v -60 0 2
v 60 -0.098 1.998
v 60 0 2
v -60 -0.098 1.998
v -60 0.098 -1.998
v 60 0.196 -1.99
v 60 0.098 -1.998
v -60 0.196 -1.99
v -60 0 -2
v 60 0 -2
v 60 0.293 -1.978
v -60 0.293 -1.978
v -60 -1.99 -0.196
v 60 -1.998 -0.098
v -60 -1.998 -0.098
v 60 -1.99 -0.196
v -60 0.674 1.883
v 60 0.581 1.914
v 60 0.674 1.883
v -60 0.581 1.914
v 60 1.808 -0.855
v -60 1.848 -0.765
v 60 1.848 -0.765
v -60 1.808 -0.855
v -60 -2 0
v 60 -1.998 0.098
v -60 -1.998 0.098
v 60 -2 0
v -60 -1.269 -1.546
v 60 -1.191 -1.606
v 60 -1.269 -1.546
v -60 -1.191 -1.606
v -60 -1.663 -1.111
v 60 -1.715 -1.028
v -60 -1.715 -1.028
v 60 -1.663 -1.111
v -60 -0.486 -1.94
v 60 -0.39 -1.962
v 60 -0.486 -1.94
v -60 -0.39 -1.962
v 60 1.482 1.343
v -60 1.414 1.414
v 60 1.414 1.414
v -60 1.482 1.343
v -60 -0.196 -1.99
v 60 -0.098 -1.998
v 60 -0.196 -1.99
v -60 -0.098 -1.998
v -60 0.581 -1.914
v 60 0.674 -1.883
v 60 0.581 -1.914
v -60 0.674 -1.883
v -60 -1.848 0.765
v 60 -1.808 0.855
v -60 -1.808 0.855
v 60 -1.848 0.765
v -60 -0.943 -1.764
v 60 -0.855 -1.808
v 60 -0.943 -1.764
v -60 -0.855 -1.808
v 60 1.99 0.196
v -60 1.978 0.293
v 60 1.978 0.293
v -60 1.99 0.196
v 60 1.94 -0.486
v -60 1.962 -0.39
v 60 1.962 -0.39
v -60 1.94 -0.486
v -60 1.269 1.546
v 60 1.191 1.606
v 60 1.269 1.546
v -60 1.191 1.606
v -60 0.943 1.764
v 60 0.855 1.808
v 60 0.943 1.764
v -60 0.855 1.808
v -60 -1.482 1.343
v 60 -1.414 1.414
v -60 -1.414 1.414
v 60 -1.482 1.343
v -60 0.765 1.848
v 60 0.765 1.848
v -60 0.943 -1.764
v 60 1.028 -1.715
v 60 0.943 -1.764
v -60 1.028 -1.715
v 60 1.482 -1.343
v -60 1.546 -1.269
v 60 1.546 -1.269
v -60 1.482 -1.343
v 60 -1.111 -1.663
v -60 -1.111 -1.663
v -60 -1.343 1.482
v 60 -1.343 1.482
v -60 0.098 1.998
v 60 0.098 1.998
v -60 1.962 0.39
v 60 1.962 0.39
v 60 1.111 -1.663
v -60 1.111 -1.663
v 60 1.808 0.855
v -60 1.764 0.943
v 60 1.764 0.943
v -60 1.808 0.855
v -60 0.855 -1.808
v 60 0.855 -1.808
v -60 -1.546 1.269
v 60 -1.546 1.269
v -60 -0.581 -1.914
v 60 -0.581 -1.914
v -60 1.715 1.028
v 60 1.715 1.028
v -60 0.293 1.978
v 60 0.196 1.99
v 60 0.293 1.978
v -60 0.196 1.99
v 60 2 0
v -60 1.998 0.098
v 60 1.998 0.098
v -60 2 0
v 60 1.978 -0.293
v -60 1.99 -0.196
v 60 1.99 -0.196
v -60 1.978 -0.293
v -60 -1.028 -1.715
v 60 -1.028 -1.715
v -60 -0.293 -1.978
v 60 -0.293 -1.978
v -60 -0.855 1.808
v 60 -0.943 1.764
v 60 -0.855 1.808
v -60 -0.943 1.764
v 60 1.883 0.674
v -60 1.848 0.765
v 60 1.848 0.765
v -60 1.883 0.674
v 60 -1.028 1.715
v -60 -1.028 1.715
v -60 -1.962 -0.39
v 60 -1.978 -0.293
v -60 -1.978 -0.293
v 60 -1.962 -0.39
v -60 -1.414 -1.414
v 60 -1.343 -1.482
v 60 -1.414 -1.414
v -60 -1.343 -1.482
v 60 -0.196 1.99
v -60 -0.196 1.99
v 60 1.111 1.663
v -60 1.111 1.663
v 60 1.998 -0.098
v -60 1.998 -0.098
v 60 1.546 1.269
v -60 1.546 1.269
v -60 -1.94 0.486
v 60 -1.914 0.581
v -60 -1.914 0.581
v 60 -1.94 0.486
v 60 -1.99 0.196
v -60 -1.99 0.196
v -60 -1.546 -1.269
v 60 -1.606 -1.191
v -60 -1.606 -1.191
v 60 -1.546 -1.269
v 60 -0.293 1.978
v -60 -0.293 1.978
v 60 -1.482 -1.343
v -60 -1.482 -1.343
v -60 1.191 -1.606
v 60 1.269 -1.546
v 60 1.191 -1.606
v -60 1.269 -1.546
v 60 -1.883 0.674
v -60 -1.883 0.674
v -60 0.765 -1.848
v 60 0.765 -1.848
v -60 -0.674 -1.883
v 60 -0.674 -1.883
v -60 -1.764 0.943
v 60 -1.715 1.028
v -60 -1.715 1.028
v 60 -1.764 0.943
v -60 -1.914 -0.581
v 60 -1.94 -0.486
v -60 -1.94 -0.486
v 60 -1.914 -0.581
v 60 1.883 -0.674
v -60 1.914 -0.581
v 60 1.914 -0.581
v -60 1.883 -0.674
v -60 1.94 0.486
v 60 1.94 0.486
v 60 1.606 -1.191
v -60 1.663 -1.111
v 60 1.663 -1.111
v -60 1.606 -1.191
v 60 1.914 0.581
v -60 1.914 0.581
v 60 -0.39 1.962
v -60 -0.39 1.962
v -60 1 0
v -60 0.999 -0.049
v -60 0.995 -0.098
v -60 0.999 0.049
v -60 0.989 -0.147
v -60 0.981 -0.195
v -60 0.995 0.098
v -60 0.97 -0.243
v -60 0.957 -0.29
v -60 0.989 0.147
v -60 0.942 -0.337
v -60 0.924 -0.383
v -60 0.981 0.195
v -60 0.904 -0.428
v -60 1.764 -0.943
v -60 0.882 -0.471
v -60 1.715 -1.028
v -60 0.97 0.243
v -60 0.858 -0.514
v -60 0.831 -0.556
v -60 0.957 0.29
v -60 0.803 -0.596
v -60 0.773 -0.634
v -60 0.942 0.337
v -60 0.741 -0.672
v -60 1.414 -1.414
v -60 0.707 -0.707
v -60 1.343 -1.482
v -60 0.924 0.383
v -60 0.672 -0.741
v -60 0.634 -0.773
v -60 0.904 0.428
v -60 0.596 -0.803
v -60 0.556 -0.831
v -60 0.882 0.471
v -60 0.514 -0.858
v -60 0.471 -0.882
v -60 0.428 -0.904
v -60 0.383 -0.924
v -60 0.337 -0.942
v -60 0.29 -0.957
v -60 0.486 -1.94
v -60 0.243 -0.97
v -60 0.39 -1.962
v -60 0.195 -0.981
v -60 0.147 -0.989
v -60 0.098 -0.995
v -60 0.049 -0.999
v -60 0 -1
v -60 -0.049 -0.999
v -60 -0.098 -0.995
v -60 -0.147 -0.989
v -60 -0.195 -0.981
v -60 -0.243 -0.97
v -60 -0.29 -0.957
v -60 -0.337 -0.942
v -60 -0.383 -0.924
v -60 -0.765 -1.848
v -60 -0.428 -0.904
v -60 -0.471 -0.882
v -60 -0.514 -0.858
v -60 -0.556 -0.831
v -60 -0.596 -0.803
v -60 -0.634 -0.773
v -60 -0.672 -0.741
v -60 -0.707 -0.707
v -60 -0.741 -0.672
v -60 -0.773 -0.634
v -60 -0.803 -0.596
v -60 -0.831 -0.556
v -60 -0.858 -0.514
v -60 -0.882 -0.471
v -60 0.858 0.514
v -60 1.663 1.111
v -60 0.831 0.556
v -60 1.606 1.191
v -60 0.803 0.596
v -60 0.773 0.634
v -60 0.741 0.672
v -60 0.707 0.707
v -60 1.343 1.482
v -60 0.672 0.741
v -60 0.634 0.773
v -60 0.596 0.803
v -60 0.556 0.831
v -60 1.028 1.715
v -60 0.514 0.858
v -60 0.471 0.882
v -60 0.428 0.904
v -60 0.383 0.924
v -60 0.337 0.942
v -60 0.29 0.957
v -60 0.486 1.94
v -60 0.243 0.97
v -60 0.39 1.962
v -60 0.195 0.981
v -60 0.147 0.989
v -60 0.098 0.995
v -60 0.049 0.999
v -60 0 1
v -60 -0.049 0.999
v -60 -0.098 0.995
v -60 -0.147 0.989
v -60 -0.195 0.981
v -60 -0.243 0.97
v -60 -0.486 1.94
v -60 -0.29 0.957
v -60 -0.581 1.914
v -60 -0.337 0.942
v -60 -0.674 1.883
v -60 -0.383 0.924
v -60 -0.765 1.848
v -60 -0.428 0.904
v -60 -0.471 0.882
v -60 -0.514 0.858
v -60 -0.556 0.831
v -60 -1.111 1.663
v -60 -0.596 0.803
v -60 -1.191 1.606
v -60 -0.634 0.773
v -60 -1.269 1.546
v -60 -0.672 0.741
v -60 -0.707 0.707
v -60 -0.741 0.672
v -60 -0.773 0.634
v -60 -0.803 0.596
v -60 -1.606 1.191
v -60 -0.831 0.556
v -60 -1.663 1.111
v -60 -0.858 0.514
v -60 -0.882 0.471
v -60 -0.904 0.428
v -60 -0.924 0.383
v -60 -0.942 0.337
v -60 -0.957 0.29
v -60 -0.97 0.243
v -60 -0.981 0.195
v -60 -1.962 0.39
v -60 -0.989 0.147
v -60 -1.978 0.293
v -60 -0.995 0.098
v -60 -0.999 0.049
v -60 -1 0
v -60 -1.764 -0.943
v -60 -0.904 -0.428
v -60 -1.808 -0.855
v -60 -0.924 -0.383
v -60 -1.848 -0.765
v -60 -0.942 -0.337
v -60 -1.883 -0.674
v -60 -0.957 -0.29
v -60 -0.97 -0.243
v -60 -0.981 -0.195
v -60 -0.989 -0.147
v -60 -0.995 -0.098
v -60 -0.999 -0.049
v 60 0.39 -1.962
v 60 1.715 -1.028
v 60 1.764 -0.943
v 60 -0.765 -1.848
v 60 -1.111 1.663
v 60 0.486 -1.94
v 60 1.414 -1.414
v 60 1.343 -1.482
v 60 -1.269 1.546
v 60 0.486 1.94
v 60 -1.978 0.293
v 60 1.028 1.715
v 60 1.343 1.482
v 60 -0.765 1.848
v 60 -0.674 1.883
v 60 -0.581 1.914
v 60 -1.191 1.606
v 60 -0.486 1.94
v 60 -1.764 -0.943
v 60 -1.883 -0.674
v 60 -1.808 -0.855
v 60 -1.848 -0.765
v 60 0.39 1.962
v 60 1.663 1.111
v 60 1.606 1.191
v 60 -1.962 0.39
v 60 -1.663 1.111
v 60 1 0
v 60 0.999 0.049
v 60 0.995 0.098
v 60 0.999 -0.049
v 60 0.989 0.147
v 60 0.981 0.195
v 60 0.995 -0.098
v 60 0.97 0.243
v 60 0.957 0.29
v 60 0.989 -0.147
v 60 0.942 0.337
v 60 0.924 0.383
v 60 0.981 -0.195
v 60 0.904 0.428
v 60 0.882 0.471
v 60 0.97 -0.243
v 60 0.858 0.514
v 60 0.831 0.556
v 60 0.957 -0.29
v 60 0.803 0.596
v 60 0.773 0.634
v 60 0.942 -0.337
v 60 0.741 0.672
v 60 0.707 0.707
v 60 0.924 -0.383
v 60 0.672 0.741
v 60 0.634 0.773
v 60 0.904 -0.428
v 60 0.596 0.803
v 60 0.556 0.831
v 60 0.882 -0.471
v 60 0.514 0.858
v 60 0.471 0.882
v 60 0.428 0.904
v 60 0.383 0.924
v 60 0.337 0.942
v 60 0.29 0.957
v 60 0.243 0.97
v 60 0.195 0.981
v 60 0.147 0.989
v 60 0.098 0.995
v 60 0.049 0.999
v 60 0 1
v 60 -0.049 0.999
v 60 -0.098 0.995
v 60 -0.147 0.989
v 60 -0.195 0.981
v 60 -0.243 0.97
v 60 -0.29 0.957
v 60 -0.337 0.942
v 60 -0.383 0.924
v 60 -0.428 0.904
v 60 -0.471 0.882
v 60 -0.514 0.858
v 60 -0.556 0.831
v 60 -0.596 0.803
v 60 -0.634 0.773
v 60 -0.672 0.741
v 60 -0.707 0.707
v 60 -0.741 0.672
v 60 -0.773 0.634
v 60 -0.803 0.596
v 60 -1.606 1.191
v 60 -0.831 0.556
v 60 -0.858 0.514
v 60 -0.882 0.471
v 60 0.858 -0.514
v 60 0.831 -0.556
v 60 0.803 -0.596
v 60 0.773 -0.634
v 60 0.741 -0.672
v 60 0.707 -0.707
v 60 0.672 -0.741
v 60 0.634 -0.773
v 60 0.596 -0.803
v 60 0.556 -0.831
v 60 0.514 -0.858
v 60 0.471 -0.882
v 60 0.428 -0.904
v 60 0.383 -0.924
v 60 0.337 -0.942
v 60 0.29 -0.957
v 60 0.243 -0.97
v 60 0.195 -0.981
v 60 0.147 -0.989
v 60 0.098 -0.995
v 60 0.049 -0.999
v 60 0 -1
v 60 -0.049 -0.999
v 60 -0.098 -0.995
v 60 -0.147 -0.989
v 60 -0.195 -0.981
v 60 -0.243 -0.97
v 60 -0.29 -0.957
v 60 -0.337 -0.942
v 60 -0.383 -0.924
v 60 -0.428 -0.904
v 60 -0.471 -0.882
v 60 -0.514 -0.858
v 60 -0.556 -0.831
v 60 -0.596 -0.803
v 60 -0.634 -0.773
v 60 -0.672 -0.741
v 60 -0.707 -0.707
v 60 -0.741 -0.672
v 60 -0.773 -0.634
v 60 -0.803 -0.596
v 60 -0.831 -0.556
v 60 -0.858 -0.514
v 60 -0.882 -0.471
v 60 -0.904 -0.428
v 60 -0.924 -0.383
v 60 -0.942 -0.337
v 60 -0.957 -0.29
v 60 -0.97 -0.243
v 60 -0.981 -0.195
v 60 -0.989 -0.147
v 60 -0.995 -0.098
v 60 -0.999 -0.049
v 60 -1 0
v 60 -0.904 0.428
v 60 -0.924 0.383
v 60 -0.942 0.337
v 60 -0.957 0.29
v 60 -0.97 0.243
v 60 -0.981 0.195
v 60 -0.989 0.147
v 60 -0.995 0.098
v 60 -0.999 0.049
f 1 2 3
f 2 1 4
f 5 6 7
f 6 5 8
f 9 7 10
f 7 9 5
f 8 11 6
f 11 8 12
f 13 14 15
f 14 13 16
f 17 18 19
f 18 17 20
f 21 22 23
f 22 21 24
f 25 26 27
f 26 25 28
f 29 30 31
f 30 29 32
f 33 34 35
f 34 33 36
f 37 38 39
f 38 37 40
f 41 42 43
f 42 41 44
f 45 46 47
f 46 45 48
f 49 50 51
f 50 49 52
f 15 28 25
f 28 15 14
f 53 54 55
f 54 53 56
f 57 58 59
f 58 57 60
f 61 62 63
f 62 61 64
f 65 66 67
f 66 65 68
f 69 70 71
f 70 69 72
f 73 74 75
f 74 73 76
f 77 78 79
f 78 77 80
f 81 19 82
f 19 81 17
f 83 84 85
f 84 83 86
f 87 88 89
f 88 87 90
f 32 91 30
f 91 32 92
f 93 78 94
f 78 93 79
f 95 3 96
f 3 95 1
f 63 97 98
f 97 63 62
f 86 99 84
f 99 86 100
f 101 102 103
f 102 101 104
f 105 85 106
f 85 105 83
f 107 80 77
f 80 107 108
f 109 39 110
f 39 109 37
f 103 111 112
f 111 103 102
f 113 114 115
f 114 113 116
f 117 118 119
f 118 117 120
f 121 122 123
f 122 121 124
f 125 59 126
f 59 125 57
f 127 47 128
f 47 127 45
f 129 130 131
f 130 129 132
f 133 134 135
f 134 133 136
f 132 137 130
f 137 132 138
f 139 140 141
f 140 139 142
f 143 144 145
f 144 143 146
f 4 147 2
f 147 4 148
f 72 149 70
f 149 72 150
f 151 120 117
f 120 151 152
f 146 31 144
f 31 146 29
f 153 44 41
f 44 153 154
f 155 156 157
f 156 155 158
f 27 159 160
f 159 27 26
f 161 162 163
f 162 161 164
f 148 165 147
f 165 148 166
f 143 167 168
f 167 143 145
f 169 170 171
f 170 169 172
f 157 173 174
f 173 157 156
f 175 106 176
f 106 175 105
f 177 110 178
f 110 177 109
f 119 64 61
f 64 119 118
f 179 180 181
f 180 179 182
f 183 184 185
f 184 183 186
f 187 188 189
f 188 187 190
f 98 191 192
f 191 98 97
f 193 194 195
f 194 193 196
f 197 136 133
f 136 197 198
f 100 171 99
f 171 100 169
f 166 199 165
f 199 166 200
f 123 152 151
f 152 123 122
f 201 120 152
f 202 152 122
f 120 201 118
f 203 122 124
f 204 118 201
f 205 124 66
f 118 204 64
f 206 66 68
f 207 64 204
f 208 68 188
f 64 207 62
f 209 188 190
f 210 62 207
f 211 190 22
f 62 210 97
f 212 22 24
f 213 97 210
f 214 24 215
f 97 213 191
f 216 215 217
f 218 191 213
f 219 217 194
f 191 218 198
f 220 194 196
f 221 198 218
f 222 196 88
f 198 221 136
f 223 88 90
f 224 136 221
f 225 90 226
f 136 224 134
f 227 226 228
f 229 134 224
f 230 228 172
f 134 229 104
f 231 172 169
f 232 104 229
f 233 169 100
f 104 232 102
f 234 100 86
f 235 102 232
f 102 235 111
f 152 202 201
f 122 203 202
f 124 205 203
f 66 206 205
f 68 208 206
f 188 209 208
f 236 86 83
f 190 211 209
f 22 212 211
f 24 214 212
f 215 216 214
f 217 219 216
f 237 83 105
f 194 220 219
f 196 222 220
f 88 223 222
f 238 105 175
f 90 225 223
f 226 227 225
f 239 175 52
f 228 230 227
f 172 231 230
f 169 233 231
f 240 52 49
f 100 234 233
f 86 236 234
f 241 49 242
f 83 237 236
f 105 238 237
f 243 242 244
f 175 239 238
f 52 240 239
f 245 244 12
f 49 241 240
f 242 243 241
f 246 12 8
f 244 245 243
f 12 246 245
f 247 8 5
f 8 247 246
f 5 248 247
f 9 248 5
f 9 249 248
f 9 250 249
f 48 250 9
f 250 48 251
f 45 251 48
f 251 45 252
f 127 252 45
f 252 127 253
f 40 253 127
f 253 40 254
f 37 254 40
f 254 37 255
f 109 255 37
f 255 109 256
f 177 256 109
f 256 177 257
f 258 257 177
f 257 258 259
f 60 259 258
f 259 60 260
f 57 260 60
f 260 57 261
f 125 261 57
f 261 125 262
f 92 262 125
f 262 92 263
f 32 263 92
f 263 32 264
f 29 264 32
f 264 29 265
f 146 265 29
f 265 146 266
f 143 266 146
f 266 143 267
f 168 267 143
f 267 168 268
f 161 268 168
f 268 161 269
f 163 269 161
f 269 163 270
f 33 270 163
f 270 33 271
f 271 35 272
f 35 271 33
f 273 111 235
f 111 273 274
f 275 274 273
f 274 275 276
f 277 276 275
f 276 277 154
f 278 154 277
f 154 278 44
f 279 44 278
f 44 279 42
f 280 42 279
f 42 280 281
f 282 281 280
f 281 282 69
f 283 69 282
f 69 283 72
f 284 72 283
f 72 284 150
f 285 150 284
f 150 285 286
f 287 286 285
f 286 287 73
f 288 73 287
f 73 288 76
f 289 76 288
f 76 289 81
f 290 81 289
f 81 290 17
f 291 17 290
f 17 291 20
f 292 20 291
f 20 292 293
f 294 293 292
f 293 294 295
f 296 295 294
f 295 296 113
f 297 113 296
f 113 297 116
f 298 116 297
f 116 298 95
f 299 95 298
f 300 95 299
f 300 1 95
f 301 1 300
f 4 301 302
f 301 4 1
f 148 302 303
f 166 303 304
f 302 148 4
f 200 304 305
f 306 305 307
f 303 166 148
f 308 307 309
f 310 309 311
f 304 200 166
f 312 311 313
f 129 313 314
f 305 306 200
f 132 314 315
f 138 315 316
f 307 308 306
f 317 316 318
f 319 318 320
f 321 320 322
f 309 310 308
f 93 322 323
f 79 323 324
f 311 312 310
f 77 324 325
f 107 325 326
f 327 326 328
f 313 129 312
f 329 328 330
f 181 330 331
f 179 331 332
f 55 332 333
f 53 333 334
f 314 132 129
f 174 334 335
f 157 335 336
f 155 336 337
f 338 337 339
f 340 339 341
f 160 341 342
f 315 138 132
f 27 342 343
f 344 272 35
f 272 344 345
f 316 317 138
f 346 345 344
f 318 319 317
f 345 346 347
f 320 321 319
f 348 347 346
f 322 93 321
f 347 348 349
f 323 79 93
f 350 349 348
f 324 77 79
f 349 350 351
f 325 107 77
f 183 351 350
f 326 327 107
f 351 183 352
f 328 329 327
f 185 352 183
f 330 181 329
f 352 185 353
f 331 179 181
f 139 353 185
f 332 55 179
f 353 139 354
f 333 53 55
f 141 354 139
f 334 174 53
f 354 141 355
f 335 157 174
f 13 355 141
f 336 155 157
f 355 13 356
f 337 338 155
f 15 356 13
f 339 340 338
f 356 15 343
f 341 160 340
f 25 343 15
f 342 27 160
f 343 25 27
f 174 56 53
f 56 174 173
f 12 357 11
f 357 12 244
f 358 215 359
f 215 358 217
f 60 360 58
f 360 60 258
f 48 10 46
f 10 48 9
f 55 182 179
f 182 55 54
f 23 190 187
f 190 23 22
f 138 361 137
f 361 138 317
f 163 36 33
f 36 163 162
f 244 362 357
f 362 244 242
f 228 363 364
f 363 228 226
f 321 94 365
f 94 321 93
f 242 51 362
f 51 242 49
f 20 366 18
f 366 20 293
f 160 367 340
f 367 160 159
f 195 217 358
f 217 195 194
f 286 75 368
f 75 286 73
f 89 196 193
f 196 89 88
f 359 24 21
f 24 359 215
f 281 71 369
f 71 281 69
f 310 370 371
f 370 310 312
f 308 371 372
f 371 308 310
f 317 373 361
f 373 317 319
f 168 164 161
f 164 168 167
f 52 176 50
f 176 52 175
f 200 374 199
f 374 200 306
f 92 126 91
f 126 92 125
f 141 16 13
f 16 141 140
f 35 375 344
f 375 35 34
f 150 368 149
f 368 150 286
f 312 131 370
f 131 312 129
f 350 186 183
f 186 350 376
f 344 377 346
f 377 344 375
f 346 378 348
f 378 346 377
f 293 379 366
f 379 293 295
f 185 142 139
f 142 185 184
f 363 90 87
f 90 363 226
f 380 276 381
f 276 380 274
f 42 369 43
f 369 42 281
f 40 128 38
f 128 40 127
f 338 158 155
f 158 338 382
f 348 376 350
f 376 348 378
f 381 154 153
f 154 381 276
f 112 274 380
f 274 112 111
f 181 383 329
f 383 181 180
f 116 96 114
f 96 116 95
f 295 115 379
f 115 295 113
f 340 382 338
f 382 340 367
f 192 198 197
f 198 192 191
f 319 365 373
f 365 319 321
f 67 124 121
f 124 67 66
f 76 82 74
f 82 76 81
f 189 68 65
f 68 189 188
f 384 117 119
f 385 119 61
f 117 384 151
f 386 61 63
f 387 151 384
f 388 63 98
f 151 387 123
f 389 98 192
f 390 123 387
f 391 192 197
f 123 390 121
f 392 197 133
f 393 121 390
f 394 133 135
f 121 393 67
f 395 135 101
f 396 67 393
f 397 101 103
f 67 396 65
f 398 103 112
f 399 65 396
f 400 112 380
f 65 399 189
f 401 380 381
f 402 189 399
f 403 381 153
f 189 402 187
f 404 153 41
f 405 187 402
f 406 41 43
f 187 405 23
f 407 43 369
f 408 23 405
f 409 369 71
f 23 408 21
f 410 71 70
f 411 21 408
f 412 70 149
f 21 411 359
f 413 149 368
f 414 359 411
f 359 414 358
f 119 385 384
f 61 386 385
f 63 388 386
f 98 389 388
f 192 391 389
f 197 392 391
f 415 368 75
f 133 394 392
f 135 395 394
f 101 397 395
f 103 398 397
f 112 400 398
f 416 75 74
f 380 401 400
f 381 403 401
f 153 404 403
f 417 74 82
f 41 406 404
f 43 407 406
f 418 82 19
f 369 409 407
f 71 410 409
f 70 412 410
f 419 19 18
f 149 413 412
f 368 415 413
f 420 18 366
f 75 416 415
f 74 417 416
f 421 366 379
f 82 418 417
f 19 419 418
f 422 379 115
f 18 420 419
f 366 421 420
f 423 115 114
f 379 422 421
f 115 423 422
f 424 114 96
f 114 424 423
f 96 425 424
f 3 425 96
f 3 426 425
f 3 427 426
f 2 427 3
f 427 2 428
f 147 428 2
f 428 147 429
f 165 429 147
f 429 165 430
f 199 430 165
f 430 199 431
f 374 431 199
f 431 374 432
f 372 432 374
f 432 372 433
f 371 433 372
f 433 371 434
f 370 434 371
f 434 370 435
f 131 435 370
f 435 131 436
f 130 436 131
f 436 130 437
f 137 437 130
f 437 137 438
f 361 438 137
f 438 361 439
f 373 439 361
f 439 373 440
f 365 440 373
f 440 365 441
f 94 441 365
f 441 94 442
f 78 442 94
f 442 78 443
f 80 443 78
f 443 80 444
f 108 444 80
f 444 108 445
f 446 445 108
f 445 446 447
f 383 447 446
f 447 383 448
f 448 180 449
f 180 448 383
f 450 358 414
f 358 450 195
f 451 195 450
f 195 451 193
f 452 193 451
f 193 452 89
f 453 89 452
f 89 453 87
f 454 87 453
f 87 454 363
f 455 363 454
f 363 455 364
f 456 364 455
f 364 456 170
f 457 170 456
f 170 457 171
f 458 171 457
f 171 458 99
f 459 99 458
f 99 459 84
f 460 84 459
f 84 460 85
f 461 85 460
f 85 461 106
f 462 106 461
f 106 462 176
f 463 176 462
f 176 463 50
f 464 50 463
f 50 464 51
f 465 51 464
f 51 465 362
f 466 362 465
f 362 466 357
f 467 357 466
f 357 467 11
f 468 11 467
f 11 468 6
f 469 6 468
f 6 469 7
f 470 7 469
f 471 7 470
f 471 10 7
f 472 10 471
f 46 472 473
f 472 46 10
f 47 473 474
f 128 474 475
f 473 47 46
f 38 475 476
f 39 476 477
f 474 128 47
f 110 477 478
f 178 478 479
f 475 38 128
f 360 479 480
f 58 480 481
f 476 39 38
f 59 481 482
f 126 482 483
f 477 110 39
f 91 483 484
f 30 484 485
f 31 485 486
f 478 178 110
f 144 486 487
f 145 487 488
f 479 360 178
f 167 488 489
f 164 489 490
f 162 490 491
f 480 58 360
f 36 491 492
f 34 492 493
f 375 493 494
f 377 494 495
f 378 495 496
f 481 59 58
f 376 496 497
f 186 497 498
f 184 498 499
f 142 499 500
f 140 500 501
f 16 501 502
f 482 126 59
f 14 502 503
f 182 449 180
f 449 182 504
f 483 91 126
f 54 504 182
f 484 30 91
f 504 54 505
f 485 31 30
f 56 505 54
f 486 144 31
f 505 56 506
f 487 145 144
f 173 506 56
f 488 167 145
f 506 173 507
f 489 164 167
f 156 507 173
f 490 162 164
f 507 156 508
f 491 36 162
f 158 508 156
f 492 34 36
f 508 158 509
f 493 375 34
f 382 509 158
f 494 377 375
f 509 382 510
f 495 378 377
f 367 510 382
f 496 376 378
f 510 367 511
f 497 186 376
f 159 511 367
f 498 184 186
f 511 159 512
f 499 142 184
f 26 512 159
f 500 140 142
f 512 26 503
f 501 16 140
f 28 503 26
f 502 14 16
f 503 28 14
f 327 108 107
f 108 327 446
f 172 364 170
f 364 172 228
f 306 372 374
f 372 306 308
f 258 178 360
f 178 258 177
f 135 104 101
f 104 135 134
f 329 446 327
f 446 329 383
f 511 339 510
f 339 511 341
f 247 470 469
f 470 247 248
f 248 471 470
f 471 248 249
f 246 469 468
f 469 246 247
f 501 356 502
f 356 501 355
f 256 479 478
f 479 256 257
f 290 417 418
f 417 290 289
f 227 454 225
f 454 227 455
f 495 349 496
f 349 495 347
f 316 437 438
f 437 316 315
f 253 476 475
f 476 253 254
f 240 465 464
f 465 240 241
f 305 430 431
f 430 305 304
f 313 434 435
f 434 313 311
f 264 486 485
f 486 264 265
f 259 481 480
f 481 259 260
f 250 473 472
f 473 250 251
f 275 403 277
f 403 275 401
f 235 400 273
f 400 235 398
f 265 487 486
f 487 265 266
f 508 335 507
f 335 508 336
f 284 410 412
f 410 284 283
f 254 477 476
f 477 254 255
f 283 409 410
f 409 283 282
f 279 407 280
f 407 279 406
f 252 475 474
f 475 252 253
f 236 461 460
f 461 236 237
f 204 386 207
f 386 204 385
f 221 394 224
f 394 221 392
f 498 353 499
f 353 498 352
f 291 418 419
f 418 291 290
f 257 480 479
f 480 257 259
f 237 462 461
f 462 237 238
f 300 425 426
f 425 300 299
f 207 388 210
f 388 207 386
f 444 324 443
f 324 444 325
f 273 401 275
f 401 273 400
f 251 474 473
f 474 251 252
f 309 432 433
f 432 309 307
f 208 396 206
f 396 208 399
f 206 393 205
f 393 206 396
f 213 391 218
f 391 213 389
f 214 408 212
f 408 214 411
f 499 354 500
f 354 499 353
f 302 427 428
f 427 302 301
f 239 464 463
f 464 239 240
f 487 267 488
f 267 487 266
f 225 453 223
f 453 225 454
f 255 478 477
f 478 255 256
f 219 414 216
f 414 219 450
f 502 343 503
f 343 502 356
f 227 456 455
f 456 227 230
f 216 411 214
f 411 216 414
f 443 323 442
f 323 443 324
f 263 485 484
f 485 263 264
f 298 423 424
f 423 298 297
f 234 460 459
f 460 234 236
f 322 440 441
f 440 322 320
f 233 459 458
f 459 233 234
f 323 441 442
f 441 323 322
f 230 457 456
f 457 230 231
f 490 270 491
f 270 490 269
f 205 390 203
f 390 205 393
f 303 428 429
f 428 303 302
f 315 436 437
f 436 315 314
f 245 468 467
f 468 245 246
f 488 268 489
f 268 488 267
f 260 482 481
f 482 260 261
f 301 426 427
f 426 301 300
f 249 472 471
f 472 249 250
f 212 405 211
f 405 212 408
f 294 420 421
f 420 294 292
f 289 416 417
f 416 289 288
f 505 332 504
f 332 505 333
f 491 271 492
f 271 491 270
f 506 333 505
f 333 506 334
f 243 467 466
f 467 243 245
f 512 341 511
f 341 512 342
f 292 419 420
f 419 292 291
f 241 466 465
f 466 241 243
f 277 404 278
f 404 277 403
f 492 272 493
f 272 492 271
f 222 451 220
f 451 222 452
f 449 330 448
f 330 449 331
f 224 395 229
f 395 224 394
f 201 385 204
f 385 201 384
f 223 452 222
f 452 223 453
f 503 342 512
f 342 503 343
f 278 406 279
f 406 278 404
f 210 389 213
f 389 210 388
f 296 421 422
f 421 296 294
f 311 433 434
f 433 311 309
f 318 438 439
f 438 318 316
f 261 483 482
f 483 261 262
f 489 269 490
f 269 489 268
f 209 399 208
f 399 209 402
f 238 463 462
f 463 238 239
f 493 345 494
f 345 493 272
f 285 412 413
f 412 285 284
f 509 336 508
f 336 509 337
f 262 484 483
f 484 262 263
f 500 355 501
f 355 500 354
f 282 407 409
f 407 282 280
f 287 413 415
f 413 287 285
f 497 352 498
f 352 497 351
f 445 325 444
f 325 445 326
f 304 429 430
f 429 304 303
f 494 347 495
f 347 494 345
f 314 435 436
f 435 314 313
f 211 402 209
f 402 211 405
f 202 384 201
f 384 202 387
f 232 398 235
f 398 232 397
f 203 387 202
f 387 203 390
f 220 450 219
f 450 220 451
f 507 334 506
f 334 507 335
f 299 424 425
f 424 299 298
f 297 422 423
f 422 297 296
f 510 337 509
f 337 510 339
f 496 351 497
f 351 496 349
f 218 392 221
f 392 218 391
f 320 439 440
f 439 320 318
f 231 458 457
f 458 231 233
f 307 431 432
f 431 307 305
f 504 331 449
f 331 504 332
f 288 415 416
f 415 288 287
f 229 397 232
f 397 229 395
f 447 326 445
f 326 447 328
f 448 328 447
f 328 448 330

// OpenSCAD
$fn = 128;

// PTFE tubing (hollow cylinder)
tube_length    = 120;  // mm
outer_diameter = 4;    // mm
inner_diameter = 2;    // mm

module ptfe_tube(L, OD, ID) {
    eps = 0.2; // small overlap to ensure clean boolean

    // Lay tube along X so front/back/left/right orthographic views show length
    rotate([0, 90, 0])
        difference() {
            cylinder(h = L, d = OD, center = true);
            cylinder(h = L + eps, d = ID, center = true);
        }
}

ptfe_tube(tube_length, outer_diameter, inner_diameter);
